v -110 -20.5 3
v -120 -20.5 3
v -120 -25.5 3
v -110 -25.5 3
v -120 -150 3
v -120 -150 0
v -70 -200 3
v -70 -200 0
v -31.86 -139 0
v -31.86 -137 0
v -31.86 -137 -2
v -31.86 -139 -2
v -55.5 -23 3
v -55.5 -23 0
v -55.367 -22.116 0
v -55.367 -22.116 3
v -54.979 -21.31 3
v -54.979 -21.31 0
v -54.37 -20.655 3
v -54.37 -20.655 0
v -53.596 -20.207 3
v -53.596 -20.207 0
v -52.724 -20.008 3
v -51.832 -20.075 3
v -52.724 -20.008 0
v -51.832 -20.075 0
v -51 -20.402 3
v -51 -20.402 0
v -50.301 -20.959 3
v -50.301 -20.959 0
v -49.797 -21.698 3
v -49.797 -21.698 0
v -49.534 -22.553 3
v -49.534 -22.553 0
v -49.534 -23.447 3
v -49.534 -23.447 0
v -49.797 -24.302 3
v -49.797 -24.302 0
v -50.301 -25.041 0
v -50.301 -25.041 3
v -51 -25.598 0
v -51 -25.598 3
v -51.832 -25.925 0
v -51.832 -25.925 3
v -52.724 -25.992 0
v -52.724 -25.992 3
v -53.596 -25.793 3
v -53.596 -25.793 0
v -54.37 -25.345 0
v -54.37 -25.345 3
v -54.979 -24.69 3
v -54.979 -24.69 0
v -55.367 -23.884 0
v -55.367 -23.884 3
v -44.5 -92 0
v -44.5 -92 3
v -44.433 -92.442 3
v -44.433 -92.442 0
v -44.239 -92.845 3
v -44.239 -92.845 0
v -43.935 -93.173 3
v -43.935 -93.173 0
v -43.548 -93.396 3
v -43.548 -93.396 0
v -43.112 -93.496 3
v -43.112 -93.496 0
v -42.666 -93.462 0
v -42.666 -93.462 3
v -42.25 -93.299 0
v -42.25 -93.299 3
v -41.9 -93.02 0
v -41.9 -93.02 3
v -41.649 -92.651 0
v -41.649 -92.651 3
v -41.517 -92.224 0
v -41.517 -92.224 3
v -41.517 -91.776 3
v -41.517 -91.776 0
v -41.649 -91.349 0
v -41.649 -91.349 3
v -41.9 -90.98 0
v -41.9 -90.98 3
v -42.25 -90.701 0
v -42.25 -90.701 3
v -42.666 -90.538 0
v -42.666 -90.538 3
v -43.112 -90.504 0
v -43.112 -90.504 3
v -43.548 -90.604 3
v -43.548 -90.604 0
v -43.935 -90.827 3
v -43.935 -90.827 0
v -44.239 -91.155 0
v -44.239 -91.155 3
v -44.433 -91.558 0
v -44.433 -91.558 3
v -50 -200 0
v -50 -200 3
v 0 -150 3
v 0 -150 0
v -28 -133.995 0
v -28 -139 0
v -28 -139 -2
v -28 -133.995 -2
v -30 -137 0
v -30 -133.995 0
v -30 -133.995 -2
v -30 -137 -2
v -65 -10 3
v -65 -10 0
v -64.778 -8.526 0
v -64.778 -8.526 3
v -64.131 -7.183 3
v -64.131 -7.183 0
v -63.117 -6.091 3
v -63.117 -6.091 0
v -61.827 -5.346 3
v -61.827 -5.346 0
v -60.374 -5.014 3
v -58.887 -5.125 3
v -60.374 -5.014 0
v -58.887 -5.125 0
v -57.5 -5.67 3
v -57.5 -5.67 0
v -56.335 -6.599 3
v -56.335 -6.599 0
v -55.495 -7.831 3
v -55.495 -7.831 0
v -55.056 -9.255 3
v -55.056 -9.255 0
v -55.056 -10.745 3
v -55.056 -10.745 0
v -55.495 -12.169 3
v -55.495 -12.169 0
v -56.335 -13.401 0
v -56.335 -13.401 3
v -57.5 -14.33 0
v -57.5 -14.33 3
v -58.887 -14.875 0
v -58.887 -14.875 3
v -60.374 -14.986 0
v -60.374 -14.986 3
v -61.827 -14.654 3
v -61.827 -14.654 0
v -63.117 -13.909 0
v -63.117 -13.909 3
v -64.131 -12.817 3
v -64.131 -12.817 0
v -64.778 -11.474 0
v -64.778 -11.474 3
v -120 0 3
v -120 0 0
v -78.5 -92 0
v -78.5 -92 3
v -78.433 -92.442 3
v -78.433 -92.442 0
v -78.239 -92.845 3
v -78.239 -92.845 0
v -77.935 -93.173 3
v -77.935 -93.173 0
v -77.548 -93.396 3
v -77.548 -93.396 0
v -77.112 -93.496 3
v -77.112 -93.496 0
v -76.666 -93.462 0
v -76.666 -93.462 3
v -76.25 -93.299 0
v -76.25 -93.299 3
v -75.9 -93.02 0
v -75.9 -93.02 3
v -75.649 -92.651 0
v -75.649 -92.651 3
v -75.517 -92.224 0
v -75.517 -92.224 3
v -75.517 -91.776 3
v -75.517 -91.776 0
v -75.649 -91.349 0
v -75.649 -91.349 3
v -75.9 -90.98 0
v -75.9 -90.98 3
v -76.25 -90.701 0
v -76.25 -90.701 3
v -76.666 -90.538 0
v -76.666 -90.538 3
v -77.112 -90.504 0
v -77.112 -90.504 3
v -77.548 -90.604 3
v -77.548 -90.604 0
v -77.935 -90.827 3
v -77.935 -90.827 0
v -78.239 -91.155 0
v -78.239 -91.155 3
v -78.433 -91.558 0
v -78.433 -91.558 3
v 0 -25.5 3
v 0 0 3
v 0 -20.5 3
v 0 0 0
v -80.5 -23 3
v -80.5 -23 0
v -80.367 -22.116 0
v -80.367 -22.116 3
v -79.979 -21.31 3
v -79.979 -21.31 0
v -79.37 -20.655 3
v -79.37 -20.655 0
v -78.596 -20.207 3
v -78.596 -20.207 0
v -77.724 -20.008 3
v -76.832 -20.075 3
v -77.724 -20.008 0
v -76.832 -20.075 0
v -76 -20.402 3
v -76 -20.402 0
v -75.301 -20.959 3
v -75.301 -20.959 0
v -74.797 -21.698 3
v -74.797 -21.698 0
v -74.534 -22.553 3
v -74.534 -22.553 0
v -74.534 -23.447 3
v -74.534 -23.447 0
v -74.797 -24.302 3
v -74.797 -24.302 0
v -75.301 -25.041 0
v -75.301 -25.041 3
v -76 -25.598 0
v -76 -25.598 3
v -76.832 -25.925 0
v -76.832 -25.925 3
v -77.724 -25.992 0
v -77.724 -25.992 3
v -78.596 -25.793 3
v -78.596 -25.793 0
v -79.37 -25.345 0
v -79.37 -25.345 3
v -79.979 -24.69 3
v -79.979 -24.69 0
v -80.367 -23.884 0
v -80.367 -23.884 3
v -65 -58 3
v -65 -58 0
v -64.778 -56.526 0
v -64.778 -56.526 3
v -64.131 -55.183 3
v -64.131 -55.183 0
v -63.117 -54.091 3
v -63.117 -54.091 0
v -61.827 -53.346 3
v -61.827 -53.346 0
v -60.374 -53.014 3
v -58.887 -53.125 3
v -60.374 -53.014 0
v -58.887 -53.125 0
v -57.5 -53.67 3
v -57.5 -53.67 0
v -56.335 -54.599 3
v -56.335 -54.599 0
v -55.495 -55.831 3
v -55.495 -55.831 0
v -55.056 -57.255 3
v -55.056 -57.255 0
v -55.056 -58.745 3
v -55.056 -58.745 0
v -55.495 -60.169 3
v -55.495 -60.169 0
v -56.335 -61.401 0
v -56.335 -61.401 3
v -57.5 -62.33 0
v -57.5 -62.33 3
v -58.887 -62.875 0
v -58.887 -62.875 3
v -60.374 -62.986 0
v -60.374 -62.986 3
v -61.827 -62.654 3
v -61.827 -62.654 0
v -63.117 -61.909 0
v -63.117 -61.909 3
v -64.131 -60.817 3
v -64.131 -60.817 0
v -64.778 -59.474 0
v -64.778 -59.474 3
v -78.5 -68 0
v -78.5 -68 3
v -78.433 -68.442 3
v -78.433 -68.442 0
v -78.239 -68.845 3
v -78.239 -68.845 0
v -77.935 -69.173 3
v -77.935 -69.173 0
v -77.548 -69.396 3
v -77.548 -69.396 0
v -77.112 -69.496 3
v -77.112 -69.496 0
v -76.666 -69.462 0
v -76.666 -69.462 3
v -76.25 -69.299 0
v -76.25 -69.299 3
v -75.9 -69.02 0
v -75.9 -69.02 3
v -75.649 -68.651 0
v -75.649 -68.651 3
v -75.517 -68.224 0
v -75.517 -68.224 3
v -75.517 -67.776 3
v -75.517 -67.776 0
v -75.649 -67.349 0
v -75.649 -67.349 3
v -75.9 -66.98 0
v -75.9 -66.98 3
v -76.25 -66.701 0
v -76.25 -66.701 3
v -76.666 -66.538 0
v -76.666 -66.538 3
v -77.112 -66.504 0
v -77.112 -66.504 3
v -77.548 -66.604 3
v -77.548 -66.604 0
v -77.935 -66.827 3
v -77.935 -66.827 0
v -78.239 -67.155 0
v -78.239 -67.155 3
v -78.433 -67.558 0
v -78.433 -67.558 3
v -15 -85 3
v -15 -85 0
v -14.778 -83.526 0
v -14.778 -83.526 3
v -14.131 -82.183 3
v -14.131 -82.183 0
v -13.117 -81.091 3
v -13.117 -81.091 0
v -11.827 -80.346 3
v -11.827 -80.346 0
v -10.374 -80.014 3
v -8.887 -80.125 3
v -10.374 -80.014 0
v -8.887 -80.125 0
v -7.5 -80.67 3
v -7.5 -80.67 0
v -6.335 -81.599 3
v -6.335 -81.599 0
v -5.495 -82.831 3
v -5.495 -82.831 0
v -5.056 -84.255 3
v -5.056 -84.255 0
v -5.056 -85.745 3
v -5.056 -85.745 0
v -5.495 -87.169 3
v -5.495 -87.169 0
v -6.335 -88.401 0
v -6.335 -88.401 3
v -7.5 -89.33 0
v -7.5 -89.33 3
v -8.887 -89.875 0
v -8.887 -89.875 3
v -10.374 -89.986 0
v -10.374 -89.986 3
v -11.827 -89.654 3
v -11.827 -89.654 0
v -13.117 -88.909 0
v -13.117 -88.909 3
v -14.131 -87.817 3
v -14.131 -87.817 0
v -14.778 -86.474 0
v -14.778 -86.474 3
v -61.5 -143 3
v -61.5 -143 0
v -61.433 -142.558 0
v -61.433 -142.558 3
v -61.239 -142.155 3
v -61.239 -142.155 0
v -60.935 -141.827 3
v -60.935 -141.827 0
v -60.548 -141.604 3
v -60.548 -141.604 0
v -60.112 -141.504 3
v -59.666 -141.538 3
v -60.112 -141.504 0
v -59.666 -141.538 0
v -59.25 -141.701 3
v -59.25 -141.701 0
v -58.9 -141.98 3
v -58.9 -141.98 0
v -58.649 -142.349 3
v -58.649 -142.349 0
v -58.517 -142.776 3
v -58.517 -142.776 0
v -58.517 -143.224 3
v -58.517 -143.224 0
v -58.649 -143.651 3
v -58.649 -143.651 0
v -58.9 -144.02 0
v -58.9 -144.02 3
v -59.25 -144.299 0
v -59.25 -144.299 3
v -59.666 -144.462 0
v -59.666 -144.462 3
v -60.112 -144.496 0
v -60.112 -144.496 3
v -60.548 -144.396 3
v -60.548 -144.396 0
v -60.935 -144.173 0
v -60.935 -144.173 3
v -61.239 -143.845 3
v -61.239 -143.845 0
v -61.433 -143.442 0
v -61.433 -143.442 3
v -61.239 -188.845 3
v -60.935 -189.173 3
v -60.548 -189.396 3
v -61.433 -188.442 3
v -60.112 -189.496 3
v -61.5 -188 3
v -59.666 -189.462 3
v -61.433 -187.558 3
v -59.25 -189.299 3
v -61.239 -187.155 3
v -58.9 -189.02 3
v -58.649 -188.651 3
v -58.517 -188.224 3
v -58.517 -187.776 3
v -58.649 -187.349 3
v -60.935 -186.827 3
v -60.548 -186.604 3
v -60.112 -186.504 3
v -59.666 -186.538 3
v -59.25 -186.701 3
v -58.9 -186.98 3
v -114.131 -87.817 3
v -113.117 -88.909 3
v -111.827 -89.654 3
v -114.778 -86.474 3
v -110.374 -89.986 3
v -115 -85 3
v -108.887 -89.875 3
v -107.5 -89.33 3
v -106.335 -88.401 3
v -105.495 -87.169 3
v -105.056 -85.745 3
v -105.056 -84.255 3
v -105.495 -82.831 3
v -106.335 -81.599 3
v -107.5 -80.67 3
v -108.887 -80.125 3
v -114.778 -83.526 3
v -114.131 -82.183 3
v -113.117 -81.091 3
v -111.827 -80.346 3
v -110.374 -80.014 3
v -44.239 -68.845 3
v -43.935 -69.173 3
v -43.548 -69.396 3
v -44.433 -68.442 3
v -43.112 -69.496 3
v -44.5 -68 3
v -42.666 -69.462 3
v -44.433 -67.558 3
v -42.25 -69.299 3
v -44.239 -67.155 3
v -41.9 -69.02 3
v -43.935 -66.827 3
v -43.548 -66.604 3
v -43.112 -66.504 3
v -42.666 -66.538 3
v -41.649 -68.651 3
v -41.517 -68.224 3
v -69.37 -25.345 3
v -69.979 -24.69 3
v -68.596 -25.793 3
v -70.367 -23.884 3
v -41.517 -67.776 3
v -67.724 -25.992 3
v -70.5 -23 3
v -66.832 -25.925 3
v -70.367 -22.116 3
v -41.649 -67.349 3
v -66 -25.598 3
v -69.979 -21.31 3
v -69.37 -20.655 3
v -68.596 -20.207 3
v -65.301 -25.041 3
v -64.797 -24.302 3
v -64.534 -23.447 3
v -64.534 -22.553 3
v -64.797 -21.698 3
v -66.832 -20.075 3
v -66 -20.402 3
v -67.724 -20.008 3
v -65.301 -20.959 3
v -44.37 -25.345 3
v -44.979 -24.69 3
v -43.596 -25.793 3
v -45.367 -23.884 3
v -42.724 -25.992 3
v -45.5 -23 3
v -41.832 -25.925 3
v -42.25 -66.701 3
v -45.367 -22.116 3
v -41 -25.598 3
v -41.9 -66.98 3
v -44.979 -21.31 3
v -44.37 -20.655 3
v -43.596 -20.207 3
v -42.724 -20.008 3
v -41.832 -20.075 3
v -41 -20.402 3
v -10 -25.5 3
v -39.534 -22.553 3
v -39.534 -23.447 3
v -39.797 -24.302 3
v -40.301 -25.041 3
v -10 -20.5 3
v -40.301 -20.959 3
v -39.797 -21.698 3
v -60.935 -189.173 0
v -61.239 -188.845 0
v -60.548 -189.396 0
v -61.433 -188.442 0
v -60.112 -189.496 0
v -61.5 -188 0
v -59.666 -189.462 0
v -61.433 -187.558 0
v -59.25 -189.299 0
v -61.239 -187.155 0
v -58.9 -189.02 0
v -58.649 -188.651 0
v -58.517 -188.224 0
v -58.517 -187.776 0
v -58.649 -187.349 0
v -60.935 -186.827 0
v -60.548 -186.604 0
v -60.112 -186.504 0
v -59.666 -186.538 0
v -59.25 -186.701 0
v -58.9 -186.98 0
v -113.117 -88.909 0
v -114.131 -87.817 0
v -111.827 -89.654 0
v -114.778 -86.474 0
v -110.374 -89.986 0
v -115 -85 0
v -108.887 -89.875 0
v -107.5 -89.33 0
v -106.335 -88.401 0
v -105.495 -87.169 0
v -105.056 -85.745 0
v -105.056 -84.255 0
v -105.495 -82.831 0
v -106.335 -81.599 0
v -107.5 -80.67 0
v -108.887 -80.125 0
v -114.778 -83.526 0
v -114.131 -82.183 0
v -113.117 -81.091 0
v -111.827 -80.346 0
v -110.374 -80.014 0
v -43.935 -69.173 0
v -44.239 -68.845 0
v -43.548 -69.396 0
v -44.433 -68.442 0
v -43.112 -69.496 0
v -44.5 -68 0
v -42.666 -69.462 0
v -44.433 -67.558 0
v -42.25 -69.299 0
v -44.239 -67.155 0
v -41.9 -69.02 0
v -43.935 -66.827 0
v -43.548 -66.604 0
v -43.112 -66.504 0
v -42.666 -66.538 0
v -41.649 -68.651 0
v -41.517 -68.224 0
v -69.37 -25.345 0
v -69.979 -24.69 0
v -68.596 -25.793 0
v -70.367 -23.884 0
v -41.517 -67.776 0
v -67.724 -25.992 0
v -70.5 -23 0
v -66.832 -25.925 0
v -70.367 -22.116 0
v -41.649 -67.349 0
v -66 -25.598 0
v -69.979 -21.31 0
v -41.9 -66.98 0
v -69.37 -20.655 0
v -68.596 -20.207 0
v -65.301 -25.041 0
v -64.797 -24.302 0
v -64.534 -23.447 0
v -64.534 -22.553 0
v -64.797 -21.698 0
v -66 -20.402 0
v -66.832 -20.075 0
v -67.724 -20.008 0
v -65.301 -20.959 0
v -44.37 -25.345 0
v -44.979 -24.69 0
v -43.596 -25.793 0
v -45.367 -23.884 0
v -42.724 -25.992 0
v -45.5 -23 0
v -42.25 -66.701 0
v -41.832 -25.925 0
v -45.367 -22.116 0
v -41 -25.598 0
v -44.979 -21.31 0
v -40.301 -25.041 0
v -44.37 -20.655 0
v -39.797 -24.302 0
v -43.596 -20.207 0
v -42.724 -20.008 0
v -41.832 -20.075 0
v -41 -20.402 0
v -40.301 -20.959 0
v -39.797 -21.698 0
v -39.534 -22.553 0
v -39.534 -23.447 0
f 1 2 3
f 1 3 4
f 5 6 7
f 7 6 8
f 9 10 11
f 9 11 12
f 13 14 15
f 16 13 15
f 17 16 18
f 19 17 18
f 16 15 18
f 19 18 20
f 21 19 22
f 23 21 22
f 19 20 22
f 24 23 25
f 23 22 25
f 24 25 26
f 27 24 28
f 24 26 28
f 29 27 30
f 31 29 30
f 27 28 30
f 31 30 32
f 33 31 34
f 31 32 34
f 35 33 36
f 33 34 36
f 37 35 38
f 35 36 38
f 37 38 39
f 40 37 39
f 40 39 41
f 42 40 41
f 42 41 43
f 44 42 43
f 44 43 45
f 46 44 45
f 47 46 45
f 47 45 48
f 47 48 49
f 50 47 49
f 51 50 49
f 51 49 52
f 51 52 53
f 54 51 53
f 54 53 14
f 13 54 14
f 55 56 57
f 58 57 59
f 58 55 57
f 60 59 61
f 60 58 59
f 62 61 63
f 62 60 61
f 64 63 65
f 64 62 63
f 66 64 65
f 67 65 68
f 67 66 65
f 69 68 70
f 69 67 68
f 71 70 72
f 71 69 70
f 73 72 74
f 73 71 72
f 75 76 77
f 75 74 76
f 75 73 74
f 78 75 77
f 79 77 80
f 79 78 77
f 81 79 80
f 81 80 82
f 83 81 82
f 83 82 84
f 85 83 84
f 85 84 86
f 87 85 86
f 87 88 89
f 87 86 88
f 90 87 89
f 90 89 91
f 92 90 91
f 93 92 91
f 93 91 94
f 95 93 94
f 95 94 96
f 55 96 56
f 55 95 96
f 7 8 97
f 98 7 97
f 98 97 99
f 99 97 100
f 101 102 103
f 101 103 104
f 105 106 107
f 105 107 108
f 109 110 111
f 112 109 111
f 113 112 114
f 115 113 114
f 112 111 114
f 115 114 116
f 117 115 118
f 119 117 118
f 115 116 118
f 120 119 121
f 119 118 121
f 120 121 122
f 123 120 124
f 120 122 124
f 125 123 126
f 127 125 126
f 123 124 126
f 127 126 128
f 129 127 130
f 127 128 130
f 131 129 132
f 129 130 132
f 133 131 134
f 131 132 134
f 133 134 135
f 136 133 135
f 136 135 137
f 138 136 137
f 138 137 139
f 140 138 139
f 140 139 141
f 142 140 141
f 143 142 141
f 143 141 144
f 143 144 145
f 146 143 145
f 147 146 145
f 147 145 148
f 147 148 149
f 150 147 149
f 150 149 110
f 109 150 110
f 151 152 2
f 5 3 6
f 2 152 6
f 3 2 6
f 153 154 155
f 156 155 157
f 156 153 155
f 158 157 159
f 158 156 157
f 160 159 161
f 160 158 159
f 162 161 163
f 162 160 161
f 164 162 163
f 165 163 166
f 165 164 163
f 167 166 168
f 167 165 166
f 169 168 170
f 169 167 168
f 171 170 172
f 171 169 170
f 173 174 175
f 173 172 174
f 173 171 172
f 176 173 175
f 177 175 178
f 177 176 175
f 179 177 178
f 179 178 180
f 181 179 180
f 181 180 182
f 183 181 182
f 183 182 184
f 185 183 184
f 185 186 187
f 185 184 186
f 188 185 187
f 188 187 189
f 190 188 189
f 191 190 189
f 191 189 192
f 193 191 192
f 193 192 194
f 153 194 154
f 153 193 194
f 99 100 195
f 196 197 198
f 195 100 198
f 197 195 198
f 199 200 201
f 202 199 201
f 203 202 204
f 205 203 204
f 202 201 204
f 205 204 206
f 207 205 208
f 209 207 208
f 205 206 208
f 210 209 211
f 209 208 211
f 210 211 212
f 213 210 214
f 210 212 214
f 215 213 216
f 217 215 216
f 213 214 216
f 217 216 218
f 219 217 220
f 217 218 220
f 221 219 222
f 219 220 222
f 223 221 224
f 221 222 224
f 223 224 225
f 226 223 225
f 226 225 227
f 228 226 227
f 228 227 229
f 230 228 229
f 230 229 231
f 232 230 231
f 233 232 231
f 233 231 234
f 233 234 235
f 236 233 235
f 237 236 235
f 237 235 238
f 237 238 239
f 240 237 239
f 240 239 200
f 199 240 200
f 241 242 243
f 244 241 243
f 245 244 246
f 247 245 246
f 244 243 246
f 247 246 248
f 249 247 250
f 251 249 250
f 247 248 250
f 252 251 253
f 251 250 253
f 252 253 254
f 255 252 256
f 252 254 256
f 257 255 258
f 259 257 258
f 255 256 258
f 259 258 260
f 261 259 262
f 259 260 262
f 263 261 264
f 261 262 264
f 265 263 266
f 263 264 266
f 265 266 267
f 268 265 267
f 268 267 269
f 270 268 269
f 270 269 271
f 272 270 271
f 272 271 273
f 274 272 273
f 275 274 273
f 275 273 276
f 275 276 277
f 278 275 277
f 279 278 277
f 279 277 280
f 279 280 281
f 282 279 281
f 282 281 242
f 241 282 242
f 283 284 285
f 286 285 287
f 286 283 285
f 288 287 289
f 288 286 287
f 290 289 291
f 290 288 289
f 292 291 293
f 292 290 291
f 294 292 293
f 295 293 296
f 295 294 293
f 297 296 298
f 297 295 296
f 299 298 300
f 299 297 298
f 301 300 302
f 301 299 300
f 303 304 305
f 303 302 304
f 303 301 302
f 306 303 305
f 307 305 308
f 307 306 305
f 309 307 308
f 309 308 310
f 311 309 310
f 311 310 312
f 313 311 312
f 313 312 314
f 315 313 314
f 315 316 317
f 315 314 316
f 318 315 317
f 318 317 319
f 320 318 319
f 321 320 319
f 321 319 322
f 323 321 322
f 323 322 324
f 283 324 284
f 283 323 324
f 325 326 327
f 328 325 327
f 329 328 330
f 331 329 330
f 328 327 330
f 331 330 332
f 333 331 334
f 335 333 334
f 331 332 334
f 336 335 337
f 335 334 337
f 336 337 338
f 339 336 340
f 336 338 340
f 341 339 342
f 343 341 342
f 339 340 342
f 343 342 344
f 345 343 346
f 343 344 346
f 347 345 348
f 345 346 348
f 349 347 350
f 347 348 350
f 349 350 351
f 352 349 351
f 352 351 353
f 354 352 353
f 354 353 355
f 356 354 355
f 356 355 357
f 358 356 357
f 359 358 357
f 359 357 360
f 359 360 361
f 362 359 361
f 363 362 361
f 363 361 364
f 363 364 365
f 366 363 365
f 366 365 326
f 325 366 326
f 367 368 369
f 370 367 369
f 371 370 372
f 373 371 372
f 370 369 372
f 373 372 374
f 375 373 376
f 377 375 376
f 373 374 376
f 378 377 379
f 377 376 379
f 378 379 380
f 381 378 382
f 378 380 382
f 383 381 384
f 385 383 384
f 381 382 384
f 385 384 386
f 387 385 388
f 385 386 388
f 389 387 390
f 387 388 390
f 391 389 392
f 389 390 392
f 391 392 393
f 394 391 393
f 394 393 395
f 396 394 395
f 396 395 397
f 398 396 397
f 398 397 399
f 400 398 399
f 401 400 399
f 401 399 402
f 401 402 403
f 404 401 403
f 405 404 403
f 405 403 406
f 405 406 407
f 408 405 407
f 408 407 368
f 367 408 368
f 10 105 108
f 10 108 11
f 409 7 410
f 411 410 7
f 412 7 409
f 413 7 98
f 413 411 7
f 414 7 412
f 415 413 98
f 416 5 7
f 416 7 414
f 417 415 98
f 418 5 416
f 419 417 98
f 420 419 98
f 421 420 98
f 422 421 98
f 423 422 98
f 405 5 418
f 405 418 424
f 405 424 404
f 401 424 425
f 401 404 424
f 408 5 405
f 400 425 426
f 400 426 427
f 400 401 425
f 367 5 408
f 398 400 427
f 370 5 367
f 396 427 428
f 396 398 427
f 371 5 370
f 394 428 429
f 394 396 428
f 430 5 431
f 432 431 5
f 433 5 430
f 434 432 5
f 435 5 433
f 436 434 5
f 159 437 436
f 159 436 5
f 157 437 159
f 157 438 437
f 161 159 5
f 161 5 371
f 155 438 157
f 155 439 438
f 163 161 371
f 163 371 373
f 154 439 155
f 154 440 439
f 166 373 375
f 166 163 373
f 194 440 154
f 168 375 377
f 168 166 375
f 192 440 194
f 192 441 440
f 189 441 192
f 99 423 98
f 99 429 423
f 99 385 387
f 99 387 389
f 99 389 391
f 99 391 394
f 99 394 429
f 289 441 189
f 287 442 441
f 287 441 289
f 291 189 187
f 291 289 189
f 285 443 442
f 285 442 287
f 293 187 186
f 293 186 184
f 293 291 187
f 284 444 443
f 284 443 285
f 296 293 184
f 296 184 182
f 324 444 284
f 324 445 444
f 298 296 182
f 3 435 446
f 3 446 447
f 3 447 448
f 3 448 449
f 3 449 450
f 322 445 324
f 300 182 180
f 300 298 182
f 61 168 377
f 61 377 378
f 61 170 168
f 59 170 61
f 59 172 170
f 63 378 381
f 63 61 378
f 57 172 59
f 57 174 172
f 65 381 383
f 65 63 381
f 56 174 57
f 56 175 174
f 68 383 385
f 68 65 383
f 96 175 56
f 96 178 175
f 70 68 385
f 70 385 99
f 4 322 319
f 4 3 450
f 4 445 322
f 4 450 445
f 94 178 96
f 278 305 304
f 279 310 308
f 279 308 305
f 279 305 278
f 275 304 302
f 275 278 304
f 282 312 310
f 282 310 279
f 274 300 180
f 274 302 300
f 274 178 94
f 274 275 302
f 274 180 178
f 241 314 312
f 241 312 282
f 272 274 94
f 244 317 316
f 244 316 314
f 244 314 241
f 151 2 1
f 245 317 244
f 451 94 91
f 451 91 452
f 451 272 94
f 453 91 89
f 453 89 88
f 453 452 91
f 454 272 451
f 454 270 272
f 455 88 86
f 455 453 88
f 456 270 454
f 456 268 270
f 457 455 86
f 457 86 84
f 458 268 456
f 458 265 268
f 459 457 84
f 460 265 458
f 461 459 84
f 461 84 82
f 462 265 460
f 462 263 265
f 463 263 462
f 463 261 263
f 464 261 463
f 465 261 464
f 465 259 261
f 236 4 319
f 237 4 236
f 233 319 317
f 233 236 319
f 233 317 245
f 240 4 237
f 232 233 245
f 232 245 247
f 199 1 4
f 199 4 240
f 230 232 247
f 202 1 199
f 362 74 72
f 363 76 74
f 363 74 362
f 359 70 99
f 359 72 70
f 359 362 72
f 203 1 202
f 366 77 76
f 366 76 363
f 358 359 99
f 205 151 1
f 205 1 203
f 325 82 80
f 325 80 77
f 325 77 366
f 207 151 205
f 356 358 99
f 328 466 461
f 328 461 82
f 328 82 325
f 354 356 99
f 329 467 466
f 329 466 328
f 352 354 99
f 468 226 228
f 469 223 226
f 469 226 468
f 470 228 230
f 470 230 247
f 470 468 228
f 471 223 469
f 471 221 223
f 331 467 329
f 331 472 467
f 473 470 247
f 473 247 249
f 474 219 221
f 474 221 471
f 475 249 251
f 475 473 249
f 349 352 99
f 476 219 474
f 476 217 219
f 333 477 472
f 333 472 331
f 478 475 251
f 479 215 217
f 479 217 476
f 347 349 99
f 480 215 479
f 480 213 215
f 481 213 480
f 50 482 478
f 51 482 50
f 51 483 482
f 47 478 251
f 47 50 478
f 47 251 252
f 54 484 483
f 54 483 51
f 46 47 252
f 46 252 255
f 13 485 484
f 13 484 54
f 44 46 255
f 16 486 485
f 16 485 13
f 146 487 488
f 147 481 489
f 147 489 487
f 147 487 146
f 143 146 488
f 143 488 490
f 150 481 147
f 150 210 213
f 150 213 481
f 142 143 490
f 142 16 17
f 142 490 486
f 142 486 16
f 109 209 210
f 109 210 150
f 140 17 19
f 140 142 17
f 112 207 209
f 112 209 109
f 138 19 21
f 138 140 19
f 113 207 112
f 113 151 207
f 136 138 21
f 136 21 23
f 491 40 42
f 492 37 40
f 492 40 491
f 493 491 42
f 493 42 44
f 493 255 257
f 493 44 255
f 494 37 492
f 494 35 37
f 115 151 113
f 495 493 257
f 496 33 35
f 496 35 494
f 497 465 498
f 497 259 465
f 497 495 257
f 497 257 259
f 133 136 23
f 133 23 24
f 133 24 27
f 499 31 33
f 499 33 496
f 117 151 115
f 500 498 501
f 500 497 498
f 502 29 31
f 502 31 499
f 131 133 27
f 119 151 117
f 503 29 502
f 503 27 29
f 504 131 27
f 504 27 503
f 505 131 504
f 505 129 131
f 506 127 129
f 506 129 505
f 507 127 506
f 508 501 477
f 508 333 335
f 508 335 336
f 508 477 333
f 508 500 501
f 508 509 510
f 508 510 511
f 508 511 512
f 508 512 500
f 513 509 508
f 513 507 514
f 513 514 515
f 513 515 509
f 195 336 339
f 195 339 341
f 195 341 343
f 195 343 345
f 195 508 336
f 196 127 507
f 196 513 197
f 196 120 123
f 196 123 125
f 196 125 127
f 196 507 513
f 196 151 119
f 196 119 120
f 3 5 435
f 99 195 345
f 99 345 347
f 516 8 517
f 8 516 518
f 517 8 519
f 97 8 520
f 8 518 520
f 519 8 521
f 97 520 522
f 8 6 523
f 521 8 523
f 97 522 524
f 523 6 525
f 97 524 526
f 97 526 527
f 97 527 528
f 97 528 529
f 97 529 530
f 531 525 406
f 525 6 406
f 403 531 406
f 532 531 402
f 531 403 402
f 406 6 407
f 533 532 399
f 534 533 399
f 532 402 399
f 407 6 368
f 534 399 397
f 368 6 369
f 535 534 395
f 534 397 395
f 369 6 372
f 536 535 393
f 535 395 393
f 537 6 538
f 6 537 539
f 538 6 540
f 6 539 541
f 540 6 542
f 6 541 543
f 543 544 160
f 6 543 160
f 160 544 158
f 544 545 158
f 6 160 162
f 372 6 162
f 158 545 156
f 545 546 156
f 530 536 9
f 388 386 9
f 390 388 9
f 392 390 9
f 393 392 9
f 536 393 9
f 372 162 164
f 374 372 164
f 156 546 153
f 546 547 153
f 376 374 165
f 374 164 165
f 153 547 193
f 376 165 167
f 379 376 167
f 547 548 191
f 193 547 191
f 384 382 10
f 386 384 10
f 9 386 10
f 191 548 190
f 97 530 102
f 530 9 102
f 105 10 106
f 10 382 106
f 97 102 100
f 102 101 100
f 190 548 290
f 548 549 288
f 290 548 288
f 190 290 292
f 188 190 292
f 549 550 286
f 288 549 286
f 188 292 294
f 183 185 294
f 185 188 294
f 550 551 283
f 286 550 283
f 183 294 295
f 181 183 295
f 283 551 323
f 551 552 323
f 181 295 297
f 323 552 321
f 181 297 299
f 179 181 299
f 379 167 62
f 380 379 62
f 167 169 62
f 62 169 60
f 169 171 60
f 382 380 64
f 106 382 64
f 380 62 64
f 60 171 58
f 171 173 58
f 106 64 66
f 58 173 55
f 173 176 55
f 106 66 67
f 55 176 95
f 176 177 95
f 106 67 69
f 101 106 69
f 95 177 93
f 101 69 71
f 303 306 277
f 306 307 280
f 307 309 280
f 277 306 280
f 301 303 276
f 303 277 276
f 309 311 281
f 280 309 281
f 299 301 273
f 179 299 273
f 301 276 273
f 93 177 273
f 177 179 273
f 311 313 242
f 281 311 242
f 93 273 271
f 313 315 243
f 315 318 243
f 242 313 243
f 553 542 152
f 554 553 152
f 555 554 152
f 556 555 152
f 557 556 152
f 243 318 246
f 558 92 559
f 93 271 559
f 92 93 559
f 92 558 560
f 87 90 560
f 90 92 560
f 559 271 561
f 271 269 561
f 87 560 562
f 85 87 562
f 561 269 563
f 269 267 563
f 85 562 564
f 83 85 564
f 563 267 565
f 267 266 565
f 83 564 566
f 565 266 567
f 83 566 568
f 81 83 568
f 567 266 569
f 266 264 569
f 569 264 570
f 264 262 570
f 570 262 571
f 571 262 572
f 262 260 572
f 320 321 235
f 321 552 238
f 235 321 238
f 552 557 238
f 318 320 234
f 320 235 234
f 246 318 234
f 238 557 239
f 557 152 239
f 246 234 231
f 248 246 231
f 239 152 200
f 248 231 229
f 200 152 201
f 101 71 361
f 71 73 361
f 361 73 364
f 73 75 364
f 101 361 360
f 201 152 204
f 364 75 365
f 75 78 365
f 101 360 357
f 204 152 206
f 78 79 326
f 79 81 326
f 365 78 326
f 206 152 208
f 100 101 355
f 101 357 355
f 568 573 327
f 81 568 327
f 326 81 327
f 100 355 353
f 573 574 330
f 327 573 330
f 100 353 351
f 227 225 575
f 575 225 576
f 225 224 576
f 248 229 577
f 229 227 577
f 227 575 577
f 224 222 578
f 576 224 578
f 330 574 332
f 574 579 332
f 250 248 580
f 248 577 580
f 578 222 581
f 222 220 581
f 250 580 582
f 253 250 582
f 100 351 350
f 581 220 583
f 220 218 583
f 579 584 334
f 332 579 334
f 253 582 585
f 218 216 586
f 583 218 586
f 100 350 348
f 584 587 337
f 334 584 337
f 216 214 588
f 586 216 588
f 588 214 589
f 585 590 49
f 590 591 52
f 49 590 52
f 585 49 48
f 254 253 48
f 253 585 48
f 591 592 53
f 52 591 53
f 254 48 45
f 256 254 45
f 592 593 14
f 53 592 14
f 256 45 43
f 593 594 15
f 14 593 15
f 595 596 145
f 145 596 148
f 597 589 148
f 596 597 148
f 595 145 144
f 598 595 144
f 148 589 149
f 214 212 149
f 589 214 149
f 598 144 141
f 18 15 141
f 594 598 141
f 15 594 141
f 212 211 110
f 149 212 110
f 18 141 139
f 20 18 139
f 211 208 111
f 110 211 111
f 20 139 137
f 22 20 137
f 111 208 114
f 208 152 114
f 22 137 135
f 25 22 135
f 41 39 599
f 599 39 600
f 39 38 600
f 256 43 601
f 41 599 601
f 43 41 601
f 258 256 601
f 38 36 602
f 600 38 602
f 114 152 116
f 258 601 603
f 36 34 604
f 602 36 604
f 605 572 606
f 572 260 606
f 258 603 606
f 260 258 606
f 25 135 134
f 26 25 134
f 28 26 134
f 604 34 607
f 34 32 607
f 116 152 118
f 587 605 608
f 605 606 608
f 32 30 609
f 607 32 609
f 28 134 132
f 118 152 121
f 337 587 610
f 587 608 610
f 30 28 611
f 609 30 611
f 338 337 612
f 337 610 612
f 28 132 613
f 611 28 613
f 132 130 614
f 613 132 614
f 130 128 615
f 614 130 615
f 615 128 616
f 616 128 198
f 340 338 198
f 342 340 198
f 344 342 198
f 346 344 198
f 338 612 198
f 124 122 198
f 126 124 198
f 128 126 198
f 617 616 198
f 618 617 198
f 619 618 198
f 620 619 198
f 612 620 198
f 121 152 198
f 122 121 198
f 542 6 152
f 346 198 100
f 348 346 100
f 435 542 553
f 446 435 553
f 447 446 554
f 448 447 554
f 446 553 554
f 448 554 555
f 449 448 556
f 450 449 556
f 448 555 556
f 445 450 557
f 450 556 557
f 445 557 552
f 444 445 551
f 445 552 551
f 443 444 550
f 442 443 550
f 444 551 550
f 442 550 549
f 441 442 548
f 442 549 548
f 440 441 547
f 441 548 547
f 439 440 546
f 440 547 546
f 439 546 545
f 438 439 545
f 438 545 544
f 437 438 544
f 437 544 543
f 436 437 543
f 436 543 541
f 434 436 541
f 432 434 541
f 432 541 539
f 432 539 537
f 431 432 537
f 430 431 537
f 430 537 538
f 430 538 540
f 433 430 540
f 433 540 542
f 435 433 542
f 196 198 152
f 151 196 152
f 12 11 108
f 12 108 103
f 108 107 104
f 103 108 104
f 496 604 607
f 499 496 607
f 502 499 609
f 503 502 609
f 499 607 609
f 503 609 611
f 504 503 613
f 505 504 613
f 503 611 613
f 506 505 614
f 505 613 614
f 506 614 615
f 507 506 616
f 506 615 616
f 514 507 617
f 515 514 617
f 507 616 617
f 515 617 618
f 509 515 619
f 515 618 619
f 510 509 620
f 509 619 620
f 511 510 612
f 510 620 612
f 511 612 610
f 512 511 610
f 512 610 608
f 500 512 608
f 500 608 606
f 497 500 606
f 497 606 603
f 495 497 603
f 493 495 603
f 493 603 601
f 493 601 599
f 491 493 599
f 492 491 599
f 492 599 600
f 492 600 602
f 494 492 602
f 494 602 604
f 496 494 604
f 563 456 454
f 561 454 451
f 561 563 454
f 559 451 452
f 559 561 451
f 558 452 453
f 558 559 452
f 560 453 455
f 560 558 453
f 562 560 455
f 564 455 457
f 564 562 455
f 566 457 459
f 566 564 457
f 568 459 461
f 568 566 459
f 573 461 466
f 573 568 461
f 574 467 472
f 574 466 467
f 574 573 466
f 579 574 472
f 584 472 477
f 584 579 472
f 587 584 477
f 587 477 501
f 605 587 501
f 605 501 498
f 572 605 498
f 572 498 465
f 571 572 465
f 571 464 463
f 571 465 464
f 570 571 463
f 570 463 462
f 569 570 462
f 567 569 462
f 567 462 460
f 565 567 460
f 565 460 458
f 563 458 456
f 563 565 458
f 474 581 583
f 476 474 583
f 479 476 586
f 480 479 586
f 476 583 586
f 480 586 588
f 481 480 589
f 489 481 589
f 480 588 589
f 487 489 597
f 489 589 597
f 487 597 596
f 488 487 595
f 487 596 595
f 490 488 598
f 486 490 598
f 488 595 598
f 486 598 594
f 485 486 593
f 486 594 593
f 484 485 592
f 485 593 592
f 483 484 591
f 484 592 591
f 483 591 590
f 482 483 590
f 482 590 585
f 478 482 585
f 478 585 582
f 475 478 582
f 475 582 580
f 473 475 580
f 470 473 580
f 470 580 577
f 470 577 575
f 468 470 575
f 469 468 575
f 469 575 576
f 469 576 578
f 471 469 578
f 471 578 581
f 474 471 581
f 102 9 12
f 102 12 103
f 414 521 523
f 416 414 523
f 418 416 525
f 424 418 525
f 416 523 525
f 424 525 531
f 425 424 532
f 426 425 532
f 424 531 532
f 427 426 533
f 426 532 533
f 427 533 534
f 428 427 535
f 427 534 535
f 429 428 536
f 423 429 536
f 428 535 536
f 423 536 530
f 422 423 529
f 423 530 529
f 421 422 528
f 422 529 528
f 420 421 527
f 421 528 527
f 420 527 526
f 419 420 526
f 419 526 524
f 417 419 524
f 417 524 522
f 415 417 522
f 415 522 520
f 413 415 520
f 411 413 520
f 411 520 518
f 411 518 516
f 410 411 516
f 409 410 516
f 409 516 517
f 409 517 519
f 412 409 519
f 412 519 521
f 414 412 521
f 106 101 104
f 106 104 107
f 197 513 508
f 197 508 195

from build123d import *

# Parameters (mm, degrees)
EXTRUSION1_DEPTH        = 3
ESQUISSE4_R             = 5
ENL_V_MAT_EXTRU_3_DEPTH = 16
ESQUISSE8_R             = 3
ENL_V_MAT_EXTRU_5_DEPTH = 8
ESQUISSE9_R             = 1.5
ENL_V_MAT_EXTRU_6_DEPTH = 10
ESQUISSE11_W            = 10
ESQUISSE11_H            = 5
ENL_V_MAT_EXTRU_9_DEPTH = 0.0001
EXTRUSION2_DEPTH        = 2
ESQUISSE5_R             = 1.5
ENL_V_MAT_EXTRU_4_DEPTH = 25.792218749
ESQUISSE3_R             = 5
ENL_V_MAT_EXTRU_2_DEPTH = 16


with BuildPart() as part:
    # Esquisse1 → Extrusion1 (new body)
    with BuildSketch(Plane.XY):
        Polygon((0, 0), (-120, 0), (-120, -150), (-70, -200), (-50, -200), (0, -150), align=None)
    extrude(amount=EXTRUSION1_DEPTH)

    # Esquisse4 → Enlèv. mat.-Extru.3 (cut)
    with BuildSketch(Plane(origin=(0, 0, 0), x_dir=(-1, 0, 0), z_dir=(0, 0, -1))):
        with Locations((60, -10)):
            Circle(ESQUISSE4_R)
        with Locations((10, -85)):
            Circle(ESQUISSE4_R)
        with Locations((110, -85)):
            Circle(ESQUISSE4_R)
    extrude(amount=-ENL_V_MAT_EXTRU_3_DEPTH, mode=Mode.SUBTRACT)

    # Esquisse8 → Enlèv. mat.-Extru.5 (cut)
    with BuildSketch(Plane(origin=(0, 0, 0), x_dir=(-1, 0, 0), z_dir=(0, 0, -1))):
        with Locations((52.5, -23)):
            Circle(ESQUISSE8_R)
        with Locations((42.5, -23)):
            Circle(ESQUISSE8_R)
        with Locations((67.5, -23)):
            Circle(ESQUISSE8_R)
        with Locations((77.5, -23)):
            Circle(ESQUISSE8_R)
    extrude(amount=-ENL_V_MAT_EXTRU_5_DEPTH, mode=Mode.SUBTRACT)

    # Esquisse9 → Enlèv. mat.-Extru.6 (cut)
    with BuildSketch(Plane(origin=(0, 0, 0), x_dir=(-1, 0, 0), z_dir=(0, 0, -1))):
        with Locations((60, -143)):
            Circle(ESQUISSE9_R)
        with Locations((60, -188)):
            Circle(ESQUISSE9_R)
    extrude(amount=-ENL_V_MAT_EXTRU_6_DEPTH, mode=Mode.SUBTRACT)

    # Esquisse11 → Enlèv. mat.-Extru.9 (cut)
    with BuildSketch(Plane.XY.offset(3)):
        with Locations((-115, -23)):
            Rectangle(ESQUISSE11_W, ESQUISSE11_H)
        with Locations((-5, -23)):
            Rectangle(ESQUISSE11_W, ESQUISSE11_H)
    extrude(amount=-ENL_V_MAT_EXTRU_9_DEPTH, mode=Mode.SUBTRACT)

    # Esquisse12 → Extrusion2 (add)
    with BuildSketch(Plane(origin=(0, 0, 0), x_dir=(-1, 0, 0), z_dir=(0, 0, -1))):
        Polygon((30, -133.99467083), (30, -137), (31.859648796, -137), (31.859648796, -139), (28, -139), (28, -133.99467083), align=None)
    extrude(amount=EXTRUSION2_DEPTH)

    # Esquisse5 → Enlèv. mat.-Extru.4 (cut)
    with BuildSketch(Plane.XY):
        with Locations(Location((-77, -68, 0), (0, 0, 180))):
            Circle(ESQUISSE5_R)
        with Locations(Location((-43, -68, 0), (0, 0, 180))):
            Circle(ESQUISSE5_R)
        with Locations(Location((-43, -92, 0), (0, 0, 180))):
            Circle(ESQUISSE5_R)
        with Locations(Location((-77, -92, 0), (0, 0, 180))):
            Circle(ESQUISSE5_R)
    extrude(amount=ENL_V_MAT_EXTRU_4_DEPTH, mode=Mode.SUBTRACT)

    # Esquisse3 → Enlèv. mat.-Extru.2 (cut)
    with BuildSketch(Plane(origin=(0, 0, 0), x_dir=(-1, 0, 0), z_dir=(0, 0, -1))):
        with Locations((60, -58)):
            Circle(ESQUISSE3_R)
    extrude(amount=-ENL_V_MAT_EXTRU_2_DEPTH, mode=Mode.SUBTRACT)


solid = part.part
